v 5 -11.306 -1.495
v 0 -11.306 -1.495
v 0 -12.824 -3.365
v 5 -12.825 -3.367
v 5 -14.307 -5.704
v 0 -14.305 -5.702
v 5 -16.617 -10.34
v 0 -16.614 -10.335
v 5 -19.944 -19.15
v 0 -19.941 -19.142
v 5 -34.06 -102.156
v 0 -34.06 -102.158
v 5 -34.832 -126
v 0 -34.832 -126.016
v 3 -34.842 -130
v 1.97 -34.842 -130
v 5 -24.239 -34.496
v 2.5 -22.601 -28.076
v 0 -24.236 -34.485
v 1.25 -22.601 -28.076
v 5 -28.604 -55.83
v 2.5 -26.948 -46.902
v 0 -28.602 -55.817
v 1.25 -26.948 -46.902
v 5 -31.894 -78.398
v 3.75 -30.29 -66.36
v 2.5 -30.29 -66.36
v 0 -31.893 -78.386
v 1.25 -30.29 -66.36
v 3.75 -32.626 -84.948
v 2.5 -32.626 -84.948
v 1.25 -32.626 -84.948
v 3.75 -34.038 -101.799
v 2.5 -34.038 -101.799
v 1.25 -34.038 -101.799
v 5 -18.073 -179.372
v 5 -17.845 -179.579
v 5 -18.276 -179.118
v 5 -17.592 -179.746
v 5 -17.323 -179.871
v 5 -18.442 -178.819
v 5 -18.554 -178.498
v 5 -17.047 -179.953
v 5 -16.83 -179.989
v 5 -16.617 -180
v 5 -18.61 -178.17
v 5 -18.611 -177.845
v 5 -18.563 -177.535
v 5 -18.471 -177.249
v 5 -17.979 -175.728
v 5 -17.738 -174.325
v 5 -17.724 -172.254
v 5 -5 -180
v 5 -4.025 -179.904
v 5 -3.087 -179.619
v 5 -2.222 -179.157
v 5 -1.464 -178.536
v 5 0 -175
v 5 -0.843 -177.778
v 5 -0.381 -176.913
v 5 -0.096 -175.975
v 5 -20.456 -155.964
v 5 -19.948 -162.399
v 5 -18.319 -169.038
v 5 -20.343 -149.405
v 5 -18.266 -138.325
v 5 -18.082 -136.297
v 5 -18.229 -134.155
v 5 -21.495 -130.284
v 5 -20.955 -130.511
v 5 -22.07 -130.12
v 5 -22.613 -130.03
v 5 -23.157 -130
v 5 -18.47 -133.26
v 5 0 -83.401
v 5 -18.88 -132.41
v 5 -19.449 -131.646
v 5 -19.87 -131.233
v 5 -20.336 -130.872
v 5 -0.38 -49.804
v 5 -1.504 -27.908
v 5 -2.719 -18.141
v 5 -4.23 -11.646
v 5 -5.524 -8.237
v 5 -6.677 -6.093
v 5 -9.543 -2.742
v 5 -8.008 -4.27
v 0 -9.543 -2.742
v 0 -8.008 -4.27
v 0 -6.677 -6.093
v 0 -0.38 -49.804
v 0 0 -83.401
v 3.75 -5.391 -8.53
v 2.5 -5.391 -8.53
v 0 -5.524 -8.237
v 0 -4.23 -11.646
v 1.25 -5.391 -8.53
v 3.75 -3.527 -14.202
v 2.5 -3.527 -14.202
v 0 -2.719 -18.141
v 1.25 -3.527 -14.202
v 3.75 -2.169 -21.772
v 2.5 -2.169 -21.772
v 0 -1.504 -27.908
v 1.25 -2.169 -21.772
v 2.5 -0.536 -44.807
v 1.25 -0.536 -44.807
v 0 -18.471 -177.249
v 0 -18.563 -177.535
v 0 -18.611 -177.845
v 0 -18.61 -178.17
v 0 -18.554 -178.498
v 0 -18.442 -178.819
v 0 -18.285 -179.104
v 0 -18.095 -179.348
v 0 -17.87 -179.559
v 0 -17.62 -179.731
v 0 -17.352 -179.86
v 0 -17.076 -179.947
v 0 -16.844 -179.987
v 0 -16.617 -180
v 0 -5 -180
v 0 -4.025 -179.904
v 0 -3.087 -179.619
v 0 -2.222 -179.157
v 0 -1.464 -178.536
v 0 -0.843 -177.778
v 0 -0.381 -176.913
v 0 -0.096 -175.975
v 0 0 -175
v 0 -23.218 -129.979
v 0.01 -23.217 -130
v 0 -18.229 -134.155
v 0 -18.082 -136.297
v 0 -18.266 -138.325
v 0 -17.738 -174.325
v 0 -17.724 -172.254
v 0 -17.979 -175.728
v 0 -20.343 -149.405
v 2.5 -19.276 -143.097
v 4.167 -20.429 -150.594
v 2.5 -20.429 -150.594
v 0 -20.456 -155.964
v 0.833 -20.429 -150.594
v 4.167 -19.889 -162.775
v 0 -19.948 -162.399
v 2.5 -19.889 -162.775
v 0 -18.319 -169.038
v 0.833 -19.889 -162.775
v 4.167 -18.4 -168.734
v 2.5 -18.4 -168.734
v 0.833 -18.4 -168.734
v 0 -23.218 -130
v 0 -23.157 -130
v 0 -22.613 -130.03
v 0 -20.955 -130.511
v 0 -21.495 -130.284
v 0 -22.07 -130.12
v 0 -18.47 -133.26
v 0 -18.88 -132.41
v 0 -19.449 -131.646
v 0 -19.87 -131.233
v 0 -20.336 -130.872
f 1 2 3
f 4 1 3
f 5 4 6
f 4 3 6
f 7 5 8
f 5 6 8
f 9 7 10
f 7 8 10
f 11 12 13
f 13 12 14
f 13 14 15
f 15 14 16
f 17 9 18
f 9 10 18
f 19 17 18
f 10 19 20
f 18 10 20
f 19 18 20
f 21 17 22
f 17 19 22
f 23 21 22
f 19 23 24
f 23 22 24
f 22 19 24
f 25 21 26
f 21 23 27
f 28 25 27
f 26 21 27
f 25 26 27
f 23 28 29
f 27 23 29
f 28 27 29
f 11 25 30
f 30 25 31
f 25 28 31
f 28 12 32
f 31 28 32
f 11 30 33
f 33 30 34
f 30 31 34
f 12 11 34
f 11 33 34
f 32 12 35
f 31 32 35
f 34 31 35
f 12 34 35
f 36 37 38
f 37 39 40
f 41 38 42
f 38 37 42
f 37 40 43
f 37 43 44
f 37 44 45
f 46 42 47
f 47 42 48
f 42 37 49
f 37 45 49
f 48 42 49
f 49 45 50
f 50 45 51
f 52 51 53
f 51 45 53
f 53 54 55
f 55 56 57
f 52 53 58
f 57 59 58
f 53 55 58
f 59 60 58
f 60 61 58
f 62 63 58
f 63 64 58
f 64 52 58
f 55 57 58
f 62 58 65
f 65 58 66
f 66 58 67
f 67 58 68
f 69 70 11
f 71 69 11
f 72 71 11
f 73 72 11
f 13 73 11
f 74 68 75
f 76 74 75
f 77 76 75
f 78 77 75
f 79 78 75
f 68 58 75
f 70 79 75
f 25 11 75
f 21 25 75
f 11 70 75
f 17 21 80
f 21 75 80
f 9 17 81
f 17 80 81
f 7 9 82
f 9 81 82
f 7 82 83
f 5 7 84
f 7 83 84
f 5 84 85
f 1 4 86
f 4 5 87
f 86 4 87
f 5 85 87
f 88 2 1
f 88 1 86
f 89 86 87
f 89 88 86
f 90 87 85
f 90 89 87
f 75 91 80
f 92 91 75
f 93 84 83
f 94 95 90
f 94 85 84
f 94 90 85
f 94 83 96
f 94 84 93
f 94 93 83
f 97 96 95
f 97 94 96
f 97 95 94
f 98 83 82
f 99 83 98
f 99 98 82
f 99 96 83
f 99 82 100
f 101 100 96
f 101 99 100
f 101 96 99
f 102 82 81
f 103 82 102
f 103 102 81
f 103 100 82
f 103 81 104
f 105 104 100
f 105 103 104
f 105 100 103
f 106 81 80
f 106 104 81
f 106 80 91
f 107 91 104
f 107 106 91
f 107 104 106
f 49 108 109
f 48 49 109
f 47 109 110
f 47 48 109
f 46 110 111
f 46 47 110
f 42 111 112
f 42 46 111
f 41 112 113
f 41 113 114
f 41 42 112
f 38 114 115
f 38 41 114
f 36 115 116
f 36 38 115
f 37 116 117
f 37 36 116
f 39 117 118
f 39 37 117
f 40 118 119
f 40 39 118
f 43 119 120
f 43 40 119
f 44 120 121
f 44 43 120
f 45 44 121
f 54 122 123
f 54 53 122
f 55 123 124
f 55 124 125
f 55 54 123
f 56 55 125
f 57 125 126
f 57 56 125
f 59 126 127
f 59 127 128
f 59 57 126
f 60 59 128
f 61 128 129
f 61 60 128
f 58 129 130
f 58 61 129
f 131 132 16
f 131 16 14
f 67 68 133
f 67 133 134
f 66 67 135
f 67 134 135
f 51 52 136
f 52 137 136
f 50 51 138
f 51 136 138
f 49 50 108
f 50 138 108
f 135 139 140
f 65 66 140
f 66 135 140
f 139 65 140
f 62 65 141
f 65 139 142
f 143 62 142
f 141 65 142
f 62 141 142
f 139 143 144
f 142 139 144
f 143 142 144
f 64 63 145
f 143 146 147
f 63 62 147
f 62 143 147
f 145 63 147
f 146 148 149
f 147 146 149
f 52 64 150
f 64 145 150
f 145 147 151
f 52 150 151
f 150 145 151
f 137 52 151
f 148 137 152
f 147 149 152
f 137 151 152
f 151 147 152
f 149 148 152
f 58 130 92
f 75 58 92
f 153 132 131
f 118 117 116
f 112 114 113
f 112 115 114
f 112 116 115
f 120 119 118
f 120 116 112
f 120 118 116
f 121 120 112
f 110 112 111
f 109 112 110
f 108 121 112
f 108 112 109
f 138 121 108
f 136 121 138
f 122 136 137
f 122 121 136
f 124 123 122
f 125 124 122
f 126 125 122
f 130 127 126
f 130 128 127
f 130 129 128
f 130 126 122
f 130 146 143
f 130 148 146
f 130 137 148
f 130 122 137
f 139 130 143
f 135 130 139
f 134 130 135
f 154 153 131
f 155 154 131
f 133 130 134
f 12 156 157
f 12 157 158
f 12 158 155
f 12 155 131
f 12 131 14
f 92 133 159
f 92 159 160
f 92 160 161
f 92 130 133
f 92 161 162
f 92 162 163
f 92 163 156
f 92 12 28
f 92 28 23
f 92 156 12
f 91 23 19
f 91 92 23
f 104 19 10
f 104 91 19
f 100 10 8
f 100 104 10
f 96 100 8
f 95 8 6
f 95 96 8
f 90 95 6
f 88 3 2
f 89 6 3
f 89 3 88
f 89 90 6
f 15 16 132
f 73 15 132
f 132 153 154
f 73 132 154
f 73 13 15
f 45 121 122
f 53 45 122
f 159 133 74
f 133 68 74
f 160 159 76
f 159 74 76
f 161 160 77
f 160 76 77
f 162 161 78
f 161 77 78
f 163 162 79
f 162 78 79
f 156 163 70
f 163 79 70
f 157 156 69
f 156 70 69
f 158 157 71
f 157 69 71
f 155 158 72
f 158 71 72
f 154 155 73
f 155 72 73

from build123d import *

# Parameters (mm, degrees)
EXTRUDE_1_DEPTH          = 5
FILLET_6_R               = 5
FILLET_7_R               = 2
FILLET_8_R               = 5
CUT_EXTRUDE_1_DEPTH      = 185.424559073
CUT_EXTRUDE_1_DEPTH_BACK = 185.424559073
SKETCH_6_W               = 27.094284284
SKETCH_6_H               = 20.392851323
CUT_EXTRUDE_2_DEPTH      = 164.712248904
SKETCH_7_W               = 91.771448639
SKETCH_7_H               = 20.028601632
CUT_EXTRUDE_3_DEPTH      = 167.349688769


# Read off the part's stored shape, not the designer's step: 凸台-拉伸1
with BuildPart() as part:
    # 凸台-拉伸1 outline → 凸台-拉伸1 (new body)
    with BuildSketch(Plane(origin=(0, 0, 0), x_dir=(0, 0, -1), z_dir=(1, 0, 0))):
        with BuildLine():
            add(Edge.make_bspline(
                [(0, -14.903846424), (2.951295662, -4.14849373), (13.496276672, -1.883966721), (29.52909514, 0), (83.401333812, 0)],
                knots=[0, 0, 0, 0, 0, 1, 1, 1, 1, 1], degree=4))
            add(Edge.make_bspline(
                [(0, -14.903846424), (13.738939295, -26.332723654), (29.4774768, -32.710998586), (74.674999713, -39.156033076), (130, -39.931386408)],
                knots=[0, 0, 0, 0, 0, 0.958214361, 0.958214361, 0.958214361, 0.958214361, 0.958214361], degree=4))
            Line((130, -39.931386408), (130, -20))
            add(Edge.make_bspline(
                [(130, -20), (142.554964398, -11.053747082), (149.196912904, -34.934175524), (158.630756241, -5.373255264), (163.289648635, -33.936740498), (166.072200522, -10.144868391), (180, -20)],
                knots=[0, 0, 0, 0, 0, 0, 0, 1, 1, 1, 1, 1, 1, 1], degree=6))
            Line((180, -20), (180, 0))
            Line((180, 0), (83.401333812, 0))
        make_face()
    extrude(amount=EXTRUDE_1_DEPTH)

    # 圆角6
    fillet_6_edges = [part.edges().sort_by_distance(p)[0] for p in [
        (2.5, -20, -130),
    ]]
    fillet(fillet_6_edges, radius=FILLET_6_R)

    # 圆角7
    fillet_7_edges = [part.edges().sort_by_distance(p)[0] for p in [
        (2.5, -20, -180),
    ]]
    fillet(fillet_7_edges, radius=FILLET_7_R)

    # 圆角8
    fillet_8_edges = [part.edges().sort_by_distance(p)[0] for p in [
        (2.5, 0, -180),
        (2.5, -39.931386408, -130),
    ]]
    fillet(fillet_8_edges, radius=FILLET_8_R)

    # 草图4 → 切除-拉伸1 (cut, two sides: drawn at the far end of the back side and taken through both)
    with BuildSketch(Plane(origin=(5, 0, 0), x_dir=(0, 0, -1), z_dir=(1, 0, 0)).offset(-CUT_EXTRUDE_1_DEPTH_BACK)):
        with BuildLine():
            add(Edge.make_bspline(
                [(1.495142471, -11.305529877), (14.835007519, -23.95714683), (75.592167753, -33.882807925), (104.343520452, -34.842413885), (130, -34.842413885)],
                knots=[0, 0, 0, 0, 0, 1, 1, 1, 1, 1], degree=4))
            add(Edge.make_bspline(
                [(0, -14.903846424), (0.275551051, -13.899660779), (0.617298034, -12.969491649), (1.023527011, -12.106738133), (1.495142471, -11.305529877)],
                knots=[0, 0, 0, 0, 0, 0.093366129, 0.093366129, 0.093366129, 0.093366129, 0.093366129], degree=4))
            add(Edge.make_bspline(
                [(0, -14.903846424), (13.419828476, -26.067268054), (28.7474456, -32.411980768), (71.57295957, -38.706985512), (124.893658481, -39.841282905)],
                knots=[0, 0, 0, 0, 0, 0.935958162, 0.935958162, 0.935958162, 0.935958162, 0.935958162], degree=4))
            add(Edge.make_bspline(
                [(130, -34.842413884), (130, -35.028759319), (129.99166601, -35.216258569), (129.974804907, -35.404332472), (129.94928895, -35.592386619), (129.915057389, -35.77981586), (129.841480351, -36.098859681), (129.806409214, -36.231082745), (129.766907364, -36.362456276), (129.722994517, -36.492760695), (129.674707397, -36.621778563), (129.58487848, -36.839515421), (129.545494286, -36.928984789), (129.503966151, -37.017626664), (129.46031708, -37.10536636), (129.414574093, -37.192130532), (129.250587102, -37.486161652), (129.122218575, -37.688294916), (128.98211374, -37.883204904), (128.830848248, -38.069925037), (128.669117931, -38.247570978), (128.255836276, -38.652154349), (127.994673555, -38.869333518), (127.716552177, -39.064613196), (127.424118002, -39.236250049), (127.120264983, -39.382959218), (126.679539096, -39.553907949), (126.549523427, -39.599440156), (126.418314531, -39.640571717), (126.286130578, -39.677270539), (126.153191519, -39.709521582), (125.832655006, -39.776296457), (125.644540113, -39.806533973), (125.455985822, -39.828044566), (125.267595854, -39.840901842), (125.079961766, -39.845246156), (124.893658481, -39.841282905)],
                knots=[0, 0, 0, 0, 0, 0, 0, 0.145130031, 0.145130031, 0.145130031, 0.145130031, 0.145130031, 0.248682026, 0.248682026, 0.248682026, 0.248682026, 0.248682026, 0.321947701, 0.321947701, 0.321947701, 0.321947701, 0.321947701, 0.500002972, 0.500002972, 0.500002972, 0.500002972, 0.500002972, 0.751317975, 0.751317975, 0.751317975, 0.751317975, 0.751317975, 0.85486997, 0.85486997, 0.85486997, 0.85486997, 0.85486997, 1, 1, 1, 1, 1, 1, 1], degree=6))
        make_face()
    extrude(amount=CUT_EXTRUDE_1_DEPTH + CUT_EXTRUDE_1_DEPTH_BACK, mode=Mode.SUBTRACT)

    # 草图6 → 切除-拉伸2 (cut, through all)
    with BuildSketch(Plane(origin=(57.793484303, -9.892917122, -28.873774023), x_dir=(-0.4401729492006857, 0.04581450966450186, -0.8967434446351822), z_dir=(0.88426202268349, -0.1513653487033851, -0.4417795903520281))):
        with Locations((120.420599257, -28.887536231)):
            Rectangle(SKETCH_6_W, SKETCH_6_H)
    extrude(amount=CUT_EXTRUDE_2_DEPTH, mode=Mode.SUBTRACT)

    # 草图7 → 切除-拉伸3 (cut, through all)
    with BuildSketch(Plane(origin=(-53.53520172, -9.024374029, -26.444544598), x_dir=(-0.43181481098590574, -0.07279057966413091, 0.8990203003966966), z_dir=(-0.886513170069574, -0.14943861555354754, -0.437906952987314))):
        with Locations((-105.176126902, -32.909539251)):
            Rectangle(SKETCH_7_W, SKETCH_7_H)
    extrude(amount=CUT_EXTRUDE_3_DEPTH, mode=Mode.SUBTRACT)


solid = part.part
